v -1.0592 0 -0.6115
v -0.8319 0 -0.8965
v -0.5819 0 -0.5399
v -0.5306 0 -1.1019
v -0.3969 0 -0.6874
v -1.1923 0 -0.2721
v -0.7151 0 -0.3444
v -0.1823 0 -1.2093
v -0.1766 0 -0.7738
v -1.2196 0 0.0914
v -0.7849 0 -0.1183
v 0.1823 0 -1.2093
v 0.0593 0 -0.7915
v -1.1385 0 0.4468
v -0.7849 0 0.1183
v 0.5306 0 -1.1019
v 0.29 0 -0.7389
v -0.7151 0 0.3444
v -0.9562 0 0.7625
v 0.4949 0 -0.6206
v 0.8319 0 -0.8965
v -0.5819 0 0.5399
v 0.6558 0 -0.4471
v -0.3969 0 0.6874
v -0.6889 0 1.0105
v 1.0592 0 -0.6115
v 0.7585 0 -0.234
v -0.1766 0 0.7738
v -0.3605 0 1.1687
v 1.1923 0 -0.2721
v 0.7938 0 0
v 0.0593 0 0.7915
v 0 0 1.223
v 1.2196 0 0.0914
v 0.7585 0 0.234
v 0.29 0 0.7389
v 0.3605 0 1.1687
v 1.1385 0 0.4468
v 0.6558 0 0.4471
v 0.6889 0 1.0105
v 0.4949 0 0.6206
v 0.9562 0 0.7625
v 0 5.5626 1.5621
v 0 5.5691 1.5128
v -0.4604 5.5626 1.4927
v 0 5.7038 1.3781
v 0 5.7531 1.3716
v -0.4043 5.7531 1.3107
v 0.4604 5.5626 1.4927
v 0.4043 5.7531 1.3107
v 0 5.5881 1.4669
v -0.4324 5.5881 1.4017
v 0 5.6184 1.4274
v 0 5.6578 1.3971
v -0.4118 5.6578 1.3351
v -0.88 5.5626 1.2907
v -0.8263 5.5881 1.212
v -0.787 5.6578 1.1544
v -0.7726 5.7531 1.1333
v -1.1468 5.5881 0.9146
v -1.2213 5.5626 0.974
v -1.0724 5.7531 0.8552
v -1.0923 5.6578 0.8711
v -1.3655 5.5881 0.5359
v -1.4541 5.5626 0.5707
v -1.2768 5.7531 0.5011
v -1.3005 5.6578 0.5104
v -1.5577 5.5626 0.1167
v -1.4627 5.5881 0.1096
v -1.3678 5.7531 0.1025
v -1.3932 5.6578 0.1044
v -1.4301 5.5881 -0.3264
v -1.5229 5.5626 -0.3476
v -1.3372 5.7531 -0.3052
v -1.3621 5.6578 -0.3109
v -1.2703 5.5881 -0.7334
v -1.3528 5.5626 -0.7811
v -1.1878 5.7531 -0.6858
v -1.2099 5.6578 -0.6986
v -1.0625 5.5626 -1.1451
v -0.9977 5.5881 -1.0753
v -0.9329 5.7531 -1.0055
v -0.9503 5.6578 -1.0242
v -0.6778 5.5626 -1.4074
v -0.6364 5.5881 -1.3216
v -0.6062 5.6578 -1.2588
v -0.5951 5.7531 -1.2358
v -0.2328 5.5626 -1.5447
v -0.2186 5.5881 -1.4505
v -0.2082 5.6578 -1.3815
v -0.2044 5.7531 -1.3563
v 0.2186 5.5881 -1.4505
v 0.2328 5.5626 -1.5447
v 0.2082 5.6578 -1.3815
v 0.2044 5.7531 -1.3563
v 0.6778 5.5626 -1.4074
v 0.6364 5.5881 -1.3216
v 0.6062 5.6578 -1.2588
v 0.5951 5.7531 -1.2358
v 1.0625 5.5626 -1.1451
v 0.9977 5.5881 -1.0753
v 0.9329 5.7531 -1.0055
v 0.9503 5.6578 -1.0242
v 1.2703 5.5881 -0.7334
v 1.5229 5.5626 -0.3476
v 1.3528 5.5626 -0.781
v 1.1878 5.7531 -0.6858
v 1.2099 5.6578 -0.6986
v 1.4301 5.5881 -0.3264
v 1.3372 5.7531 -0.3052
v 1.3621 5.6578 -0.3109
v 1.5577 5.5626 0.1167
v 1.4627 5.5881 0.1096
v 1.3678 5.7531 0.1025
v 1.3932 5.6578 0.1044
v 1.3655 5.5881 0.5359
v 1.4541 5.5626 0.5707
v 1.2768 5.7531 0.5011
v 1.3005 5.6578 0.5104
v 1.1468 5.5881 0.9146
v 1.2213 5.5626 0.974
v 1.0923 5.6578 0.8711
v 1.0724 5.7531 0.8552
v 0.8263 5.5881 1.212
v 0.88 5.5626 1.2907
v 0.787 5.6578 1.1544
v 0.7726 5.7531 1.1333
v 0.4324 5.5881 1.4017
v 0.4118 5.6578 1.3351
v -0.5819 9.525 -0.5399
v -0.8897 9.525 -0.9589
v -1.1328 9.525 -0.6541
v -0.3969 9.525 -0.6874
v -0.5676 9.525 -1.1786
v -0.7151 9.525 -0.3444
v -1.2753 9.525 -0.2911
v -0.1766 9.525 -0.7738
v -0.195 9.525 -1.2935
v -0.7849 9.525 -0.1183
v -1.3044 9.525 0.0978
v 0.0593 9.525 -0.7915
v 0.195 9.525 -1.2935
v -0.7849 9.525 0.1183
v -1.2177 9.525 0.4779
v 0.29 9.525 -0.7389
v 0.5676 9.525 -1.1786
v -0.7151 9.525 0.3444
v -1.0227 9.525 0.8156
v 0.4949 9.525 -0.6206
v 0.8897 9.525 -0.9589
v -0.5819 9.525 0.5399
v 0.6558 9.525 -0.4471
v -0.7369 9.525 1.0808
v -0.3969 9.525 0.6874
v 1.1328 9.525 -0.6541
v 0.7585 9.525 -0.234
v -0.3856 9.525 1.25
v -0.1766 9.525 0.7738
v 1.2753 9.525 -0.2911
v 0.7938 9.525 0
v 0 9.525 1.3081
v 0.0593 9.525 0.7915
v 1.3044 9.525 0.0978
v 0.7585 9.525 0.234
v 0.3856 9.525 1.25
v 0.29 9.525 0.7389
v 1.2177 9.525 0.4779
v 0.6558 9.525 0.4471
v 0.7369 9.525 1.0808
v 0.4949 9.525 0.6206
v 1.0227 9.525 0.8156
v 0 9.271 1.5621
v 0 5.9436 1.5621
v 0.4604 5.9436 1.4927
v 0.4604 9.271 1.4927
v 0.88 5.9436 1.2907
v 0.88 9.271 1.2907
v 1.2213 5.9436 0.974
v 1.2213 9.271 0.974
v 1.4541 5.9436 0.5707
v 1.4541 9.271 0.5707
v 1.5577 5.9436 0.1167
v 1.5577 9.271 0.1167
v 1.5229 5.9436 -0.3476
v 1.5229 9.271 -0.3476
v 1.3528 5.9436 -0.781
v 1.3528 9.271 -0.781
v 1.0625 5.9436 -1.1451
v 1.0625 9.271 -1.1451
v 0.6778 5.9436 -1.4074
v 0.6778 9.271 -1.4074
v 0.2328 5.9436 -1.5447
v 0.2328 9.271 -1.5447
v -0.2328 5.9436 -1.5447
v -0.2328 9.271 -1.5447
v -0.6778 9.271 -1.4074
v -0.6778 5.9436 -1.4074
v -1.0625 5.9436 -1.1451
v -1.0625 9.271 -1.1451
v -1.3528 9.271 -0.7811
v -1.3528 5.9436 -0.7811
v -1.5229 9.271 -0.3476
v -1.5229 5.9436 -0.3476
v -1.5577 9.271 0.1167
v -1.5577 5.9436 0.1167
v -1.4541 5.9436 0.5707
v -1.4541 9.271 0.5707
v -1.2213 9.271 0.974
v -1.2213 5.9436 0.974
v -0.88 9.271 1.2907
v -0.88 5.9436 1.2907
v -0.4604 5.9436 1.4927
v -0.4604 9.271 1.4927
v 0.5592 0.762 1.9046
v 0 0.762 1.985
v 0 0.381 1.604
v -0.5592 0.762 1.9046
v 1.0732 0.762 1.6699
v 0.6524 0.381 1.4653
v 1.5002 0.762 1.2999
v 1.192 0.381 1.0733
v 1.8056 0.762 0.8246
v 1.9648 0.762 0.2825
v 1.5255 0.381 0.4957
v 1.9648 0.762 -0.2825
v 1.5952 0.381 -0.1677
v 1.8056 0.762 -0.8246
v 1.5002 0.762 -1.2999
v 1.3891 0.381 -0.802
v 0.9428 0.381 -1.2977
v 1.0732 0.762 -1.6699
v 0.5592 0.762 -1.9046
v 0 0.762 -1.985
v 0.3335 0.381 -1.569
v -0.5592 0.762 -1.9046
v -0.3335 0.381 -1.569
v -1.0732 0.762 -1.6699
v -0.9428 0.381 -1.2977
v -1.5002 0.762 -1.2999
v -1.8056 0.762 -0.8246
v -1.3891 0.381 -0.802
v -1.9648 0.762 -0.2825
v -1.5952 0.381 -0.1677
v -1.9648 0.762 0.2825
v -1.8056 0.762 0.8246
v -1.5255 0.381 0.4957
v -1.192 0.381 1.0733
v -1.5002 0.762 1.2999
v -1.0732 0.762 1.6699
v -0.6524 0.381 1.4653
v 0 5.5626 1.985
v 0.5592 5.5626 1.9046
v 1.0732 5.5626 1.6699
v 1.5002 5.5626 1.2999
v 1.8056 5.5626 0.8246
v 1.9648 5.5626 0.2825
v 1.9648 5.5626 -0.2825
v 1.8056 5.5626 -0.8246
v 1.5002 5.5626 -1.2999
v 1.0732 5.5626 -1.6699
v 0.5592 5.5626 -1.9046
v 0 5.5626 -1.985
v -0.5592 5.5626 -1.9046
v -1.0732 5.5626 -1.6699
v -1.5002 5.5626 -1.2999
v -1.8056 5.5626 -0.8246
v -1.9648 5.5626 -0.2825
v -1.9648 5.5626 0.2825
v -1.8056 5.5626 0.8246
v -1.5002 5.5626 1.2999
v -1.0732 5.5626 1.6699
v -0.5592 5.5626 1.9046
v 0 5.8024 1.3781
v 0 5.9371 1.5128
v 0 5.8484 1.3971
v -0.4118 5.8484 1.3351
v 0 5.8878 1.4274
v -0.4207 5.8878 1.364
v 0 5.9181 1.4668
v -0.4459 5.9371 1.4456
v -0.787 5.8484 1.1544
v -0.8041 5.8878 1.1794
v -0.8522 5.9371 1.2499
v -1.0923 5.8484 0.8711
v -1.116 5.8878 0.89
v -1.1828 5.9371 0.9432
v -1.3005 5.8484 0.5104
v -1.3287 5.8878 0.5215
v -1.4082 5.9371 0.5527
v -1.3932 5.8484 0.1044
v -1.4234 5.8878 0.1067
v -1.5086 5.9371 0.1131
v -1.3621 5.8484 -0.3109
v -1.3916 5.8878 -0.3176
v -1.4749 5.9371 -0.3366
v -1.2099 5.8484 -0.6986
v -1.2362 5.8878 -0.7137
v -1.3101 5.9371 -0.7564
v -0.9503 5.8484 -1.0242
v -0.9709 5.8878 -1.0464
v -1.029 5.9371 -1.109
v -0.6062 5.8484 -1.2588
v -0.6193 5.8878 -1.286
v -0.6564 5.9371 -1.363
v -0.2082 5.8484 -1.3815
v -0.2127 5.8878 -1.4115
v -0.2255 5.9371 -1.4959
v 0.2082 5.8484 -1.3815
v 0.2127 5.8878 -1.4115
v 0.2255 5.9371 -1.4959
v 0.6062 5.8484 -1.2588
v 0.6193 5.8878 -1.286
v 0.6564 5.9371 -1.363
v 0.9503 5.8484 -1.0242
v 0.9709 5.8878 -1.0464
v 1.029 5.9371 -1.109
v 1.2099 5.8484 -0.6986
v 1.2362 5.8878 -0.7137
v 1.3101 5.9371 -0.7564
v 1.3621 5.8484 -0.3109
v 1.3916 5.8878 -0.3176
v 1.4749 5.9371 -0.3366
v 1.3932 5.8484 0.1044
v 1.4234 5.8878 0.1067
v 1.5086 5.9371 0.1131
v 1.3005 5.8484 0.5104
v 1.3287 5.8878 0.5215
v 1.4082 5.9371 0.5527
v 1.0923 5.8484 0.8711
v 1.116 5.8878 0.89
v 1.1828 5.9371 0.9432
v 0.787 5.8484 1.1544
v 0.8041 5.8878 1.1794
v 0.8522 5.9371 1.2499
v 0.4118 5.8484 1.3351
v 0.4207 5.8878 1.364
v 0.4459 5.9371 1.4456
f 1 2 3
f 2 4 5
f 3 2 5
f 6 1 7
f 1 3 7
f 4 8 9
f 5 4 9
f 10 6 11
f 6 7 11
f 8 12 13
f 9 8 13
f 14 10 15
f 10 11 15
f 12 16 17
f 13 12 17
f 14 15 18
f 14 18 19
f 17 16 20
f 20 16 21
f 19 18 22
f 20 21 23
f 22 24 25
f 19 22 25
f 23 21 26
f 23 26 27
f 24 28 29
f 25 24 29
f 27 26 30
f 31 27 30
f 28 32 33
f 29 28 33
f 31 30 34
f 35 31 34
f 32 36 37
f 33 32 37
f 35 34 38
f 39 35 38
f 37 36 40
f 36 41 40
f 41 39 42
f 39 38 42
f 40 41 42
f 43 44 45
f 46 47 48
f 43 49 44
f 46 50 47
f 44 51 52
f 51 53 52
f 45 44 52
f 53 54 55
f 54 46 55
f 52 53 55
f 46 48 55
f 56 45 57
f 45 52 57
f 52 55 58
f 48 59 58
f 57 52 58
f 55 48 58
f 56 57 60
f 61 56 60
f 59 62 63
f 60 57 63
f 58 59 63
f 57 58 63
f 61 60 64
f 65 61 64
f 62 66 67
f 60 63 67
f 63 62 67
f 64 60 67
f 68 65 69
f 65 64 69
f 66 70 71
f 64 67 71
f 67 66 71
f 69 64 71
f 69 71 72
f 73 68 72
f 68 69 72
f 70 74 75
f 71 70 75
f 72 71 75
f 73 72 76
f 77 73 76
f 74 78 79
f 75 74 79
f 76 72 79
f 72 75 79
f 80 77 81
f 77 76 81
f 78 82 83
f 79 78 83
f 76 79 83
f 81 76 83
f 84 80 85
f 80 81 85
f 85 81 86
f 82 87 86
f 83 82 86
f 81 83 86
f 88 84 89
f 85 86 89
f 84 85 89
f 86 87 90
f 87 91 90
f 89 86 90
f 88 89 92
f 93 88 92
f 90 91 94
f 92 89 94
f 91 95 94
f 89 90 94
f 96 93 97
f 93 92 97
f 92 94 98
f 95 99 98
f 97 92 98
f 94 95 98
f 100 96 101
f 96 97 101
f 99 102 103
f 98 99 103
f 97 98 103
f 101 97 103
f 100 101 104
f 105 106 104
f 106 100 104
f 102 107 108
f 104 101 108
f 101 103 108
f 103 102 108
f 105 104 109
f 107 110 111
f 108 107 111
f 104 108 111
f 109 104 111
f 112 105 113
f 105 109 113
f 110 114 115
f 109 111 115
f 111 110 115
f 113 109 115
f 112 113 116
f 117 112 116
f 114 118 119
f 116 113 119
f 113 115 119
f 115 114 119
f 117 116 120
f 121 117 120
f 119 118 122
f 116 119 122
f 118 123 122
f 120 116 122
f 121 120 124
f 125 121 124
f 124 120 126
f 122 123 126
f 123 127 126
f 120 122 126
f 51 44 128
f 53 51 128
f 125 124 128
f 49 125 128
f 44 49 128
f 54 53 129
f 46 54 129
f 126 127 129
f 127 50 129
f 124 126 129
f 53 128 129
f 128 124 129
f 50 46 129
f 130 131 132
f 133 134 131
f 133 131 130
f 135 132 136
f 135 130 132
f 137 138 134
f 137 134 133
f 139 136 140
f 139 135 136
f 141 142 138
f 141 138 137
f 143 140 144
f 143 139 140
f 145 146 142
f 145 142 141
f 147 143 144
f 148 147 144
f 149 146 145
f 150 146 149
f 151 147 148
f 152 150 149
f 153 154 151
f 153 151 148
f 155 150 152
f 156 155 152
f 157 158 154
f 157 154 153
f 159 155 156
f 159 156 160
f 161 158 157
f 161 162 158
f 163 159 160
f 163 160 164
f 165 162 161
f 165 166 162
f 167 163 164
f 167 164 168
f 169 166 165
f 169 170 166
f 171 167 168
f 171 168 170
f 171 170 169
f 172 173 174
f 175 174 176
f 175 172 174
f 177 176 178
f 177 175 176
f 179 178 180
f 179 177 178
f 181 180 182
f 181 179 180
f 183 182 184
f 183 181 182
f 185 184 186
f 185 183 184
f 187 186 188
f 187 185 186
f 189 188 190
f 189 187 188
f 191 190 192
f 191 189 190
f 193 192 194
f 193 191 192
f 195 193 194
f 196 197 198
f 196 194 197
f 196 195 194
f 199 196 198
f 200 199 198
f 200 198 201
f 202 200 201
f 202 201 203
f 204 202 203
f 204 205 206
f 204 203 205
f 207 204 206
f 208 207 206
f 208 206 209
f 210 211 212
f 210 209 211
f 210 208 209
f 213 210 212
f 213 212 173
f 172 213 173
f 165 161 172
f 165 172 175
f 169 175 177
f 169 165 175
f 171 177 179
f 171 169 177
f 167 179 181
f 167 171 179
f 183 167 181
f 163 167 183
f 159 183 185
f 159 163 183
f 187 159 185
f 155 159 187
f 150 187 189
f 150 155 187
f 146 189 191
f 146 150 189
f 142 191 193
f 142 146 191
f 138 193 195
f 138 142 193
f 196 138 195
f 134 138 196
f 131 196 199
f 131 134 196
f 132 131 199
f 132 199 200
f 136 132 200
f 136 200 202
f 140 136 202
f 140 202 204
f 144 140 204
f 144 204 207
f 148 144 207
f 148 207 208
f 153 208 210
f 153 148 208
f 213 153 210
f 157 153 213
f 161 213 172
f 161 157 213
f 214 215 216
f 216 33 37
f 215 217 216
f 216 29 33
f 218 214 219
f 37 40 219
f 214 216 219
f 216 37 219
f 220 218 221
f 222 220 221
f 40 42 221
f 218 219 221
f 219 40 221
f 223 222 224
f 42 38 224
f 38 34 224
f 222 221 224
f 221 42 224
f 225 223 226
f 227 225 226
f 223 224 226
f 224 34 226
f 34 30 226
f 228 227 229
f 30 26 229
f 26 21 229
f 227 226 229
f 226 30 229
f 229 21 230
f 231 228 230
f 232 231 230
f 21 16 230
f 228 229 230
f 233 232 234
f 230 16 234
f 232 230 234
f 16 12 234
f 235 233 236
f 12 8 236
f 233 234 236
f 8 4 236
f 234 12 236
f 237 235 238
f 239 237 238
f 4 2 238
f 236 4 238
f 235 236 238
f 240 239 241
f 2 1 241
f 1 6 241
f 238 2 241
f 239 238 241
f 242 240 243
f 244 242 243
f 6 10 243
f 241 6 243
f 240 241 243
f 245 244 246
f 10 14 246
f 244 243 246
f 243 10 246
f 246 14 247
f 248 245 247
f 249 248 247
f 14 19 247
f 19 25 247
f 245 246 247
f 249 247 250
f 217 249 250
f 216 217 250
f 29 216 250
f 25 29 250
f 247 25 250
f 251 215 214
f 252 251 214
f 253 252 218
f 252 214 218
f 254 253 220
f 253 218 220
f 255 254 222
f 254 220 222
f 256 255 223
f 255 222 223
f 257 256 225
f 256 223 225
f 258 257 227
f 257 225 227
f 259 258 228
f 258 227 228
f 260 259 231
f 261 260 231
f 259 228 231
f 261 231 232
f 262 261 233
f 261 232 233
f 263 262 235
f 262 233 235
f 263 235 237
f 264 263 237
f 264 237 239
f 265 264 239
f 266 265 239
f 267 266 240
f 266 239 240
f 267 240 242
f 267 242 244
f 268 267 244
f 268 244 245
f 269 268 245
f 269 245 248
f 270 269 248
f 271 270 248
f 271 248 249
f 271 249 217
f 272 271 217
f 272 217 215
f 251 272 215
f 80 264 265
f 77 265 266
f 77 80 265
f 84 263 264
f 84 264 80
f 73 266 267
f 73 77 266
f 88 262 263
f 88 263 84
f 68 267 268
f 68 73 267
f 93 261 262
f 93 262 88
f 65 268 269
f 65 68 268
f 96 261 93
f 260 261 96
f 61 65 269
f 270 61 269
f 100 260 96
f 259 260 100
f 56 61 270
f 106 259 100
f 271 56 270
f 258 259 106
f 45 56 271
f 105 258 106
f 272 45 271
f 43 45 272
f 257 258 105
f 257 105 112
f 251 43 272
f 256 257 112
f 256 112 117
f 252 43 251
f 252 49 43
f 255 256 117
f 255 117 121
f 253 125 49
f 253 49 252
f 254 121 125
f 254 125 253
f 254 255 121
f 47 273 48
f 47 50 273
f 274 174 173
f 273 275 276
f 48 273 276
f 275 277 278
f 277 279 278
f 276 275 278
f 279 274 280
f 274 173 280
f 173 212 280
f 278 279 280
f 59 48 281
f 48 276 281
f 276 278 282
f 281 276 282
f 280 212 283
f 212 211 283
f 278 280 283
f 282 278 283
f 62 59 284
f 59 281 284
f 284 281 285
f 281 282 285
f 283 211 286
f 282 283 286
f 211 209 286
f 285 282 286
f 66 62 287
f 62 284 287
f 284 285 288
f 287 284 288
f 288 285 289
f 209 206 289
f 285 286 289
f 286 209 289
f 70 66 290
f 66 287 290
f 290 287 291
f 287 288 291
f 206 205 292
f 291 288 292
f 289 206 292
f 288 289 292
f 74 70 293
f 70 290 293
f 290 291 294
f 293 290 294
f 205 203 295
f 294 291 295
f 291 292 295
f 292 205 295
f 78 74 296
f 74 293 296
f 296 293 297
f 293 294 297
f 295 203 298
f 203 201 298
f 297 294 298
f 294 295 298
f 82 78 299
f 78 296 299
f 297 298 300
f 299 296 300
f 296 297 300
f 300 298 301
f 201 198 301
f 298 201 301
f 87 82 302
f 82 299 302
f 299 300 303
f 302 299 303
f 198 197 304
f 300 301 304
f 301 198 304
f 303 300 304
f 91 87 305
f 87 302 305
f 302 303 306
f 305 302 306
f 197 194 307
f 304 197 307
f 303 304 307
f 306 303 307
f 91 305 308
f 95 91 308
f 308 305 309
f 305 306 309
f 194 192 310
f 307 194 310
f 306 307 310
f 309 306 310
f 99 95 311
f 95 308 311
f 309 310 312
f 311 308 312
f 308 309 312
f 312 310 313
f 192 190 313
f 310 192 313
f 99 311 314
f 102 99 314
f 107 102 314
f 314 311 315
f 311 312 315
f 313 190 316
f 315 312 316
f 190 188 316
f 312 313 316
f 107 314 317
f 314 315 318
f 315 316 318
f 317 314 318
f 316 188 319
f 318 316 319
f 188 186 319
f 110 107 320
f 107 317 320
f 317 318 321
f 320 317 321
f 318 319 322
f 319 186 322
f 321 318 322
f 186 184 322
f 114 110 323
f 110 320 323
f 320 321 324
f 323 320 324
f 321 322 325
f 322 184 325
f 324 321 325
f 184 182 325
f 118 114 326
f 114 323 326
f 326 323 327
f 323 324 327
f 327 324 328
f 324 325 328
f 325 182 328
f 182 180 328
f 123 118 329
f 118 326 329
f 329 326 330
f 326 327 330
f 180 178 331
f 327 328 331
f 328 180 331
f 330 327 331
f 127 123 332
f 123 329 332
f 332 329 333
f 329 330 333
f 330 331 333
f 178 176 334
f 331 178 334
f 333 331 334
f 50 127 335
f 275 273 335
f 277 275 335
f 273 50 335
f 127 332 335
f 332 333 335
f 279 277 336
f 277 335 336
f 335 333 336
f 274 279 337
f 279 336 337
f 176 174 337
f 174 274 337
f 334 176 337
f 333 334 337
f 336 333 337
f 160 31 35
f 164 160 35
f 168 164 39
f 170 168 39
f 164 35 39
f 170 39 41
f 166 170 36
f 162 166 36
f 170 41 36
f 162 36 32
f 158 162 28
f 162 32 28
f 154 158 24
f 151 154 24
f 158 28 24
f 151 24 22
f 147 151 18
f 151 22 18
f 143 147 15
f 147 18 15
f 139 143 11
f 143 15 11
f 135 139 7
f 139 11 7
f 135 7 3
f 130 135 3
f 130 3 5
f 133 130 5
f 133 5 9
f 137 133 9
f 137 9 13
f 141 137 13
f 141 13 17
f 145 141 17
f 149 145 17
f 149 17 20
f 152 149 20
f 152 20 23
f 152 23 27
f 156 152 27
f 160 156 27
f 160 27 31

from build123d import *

# Parameters (mm, degrees)
SKETCH1_R                      = 1.98501
BASE_EXTRUDE_DEPTH             = 9.525
SKETCH2_R                      = 1.98501
SKETCH2_R_2                    = 1.5621
CUT_EXTRUDE2_DEPTH             = 3.9624
CHAMFER1_SIZE                  = 0.254
CHAMFER2_SIZE                  = 0.762
SKETCH4_R                      = 0.1905
F_1_16_0_0625_DIAMETER_HOLE1_D = 1.5875


with BuildPart() as part:
    # Sketch1 → Base-Extrude (new body)
    with BuildSketch(Plane(origin=(0, 0, 0), x_dir=(1, 0, 0), z_dir=(0, 1, 0))):
        with Locations(Location((0, 0, 0), (0, 0, 270))):  # turned: the seam where the file's is
            Circle(SKETCH1_R)
    extrude(amount=BASE_EXTRUDE_DEPTH)

    # Sketch2 → Cut-Extrude2 (cut)
    with BuildSketch(Plane(origin=(0, 9.525, 0), x_dir=(1, 0, 0), z_dir=(0, 1, 0))):
        with Locations(Location((0, 0, 0), (0, 0, 270))):  # turned: the seam where the file's is
            Circle(SKETCH2_R)
        with Locations(Location((0, 0, 0), (0, 0, 270))):  # turned: the seam where the file's is
            Circle(SKETCH2_R_2, mode=Mode.SUBTRACT)
    extrude(amount=-CUT_EXTRUDE2_DEPTH, mode=Mode.SUBTRACT)

    # Chamfer1
    chamfer1_edges = [part.edges().sort_by_distance(p)[0] for p in [
        (0, 9.525, -1.5621),
    ]]
    chamfer(chamfer1_edges, length=CHAMFER1_SIZE)

    # Chamfer2
    chamfer2_edges = [part.edges().sort_by_distance(p)[0] for p in [
        (0, 0, -1.98501),
    ]]
    chamfer(chamfer2_edges, length=CHAMFER2_SIZE)

    # Sketch4 → Cut-Revolve1 (revolve, cut)
    with BuildSketch(Plane.XY, mode=Mode.PRIVATE) as cut_revolve1_sk:
        with Locations((-1.5621, 5.7531)):
            Circle(SKETCH4_R)
    revolve(cut_revolve1_sk.sketch.rotate(Axis((0, 9.525, 0), (0, -1, 0)), 270), axis=Axis((0, 9.525, 0), (0, -1, 0)), mode=Mode.SUBTRACT)  # turned: the seam where the file's is

    # 1/16 (0.0625) Diameter Hole1 (through all)
    with Locations(Plane(origin=(0, 9.525, 0), x_dir=(-1, 0, 0), z_dir=(0, 1, 0))):
        with Locations((0, 0)):
            Hole(F_1_16_0_0625_DIAMETER_HOLE1_D / 2)


solid = part.part
